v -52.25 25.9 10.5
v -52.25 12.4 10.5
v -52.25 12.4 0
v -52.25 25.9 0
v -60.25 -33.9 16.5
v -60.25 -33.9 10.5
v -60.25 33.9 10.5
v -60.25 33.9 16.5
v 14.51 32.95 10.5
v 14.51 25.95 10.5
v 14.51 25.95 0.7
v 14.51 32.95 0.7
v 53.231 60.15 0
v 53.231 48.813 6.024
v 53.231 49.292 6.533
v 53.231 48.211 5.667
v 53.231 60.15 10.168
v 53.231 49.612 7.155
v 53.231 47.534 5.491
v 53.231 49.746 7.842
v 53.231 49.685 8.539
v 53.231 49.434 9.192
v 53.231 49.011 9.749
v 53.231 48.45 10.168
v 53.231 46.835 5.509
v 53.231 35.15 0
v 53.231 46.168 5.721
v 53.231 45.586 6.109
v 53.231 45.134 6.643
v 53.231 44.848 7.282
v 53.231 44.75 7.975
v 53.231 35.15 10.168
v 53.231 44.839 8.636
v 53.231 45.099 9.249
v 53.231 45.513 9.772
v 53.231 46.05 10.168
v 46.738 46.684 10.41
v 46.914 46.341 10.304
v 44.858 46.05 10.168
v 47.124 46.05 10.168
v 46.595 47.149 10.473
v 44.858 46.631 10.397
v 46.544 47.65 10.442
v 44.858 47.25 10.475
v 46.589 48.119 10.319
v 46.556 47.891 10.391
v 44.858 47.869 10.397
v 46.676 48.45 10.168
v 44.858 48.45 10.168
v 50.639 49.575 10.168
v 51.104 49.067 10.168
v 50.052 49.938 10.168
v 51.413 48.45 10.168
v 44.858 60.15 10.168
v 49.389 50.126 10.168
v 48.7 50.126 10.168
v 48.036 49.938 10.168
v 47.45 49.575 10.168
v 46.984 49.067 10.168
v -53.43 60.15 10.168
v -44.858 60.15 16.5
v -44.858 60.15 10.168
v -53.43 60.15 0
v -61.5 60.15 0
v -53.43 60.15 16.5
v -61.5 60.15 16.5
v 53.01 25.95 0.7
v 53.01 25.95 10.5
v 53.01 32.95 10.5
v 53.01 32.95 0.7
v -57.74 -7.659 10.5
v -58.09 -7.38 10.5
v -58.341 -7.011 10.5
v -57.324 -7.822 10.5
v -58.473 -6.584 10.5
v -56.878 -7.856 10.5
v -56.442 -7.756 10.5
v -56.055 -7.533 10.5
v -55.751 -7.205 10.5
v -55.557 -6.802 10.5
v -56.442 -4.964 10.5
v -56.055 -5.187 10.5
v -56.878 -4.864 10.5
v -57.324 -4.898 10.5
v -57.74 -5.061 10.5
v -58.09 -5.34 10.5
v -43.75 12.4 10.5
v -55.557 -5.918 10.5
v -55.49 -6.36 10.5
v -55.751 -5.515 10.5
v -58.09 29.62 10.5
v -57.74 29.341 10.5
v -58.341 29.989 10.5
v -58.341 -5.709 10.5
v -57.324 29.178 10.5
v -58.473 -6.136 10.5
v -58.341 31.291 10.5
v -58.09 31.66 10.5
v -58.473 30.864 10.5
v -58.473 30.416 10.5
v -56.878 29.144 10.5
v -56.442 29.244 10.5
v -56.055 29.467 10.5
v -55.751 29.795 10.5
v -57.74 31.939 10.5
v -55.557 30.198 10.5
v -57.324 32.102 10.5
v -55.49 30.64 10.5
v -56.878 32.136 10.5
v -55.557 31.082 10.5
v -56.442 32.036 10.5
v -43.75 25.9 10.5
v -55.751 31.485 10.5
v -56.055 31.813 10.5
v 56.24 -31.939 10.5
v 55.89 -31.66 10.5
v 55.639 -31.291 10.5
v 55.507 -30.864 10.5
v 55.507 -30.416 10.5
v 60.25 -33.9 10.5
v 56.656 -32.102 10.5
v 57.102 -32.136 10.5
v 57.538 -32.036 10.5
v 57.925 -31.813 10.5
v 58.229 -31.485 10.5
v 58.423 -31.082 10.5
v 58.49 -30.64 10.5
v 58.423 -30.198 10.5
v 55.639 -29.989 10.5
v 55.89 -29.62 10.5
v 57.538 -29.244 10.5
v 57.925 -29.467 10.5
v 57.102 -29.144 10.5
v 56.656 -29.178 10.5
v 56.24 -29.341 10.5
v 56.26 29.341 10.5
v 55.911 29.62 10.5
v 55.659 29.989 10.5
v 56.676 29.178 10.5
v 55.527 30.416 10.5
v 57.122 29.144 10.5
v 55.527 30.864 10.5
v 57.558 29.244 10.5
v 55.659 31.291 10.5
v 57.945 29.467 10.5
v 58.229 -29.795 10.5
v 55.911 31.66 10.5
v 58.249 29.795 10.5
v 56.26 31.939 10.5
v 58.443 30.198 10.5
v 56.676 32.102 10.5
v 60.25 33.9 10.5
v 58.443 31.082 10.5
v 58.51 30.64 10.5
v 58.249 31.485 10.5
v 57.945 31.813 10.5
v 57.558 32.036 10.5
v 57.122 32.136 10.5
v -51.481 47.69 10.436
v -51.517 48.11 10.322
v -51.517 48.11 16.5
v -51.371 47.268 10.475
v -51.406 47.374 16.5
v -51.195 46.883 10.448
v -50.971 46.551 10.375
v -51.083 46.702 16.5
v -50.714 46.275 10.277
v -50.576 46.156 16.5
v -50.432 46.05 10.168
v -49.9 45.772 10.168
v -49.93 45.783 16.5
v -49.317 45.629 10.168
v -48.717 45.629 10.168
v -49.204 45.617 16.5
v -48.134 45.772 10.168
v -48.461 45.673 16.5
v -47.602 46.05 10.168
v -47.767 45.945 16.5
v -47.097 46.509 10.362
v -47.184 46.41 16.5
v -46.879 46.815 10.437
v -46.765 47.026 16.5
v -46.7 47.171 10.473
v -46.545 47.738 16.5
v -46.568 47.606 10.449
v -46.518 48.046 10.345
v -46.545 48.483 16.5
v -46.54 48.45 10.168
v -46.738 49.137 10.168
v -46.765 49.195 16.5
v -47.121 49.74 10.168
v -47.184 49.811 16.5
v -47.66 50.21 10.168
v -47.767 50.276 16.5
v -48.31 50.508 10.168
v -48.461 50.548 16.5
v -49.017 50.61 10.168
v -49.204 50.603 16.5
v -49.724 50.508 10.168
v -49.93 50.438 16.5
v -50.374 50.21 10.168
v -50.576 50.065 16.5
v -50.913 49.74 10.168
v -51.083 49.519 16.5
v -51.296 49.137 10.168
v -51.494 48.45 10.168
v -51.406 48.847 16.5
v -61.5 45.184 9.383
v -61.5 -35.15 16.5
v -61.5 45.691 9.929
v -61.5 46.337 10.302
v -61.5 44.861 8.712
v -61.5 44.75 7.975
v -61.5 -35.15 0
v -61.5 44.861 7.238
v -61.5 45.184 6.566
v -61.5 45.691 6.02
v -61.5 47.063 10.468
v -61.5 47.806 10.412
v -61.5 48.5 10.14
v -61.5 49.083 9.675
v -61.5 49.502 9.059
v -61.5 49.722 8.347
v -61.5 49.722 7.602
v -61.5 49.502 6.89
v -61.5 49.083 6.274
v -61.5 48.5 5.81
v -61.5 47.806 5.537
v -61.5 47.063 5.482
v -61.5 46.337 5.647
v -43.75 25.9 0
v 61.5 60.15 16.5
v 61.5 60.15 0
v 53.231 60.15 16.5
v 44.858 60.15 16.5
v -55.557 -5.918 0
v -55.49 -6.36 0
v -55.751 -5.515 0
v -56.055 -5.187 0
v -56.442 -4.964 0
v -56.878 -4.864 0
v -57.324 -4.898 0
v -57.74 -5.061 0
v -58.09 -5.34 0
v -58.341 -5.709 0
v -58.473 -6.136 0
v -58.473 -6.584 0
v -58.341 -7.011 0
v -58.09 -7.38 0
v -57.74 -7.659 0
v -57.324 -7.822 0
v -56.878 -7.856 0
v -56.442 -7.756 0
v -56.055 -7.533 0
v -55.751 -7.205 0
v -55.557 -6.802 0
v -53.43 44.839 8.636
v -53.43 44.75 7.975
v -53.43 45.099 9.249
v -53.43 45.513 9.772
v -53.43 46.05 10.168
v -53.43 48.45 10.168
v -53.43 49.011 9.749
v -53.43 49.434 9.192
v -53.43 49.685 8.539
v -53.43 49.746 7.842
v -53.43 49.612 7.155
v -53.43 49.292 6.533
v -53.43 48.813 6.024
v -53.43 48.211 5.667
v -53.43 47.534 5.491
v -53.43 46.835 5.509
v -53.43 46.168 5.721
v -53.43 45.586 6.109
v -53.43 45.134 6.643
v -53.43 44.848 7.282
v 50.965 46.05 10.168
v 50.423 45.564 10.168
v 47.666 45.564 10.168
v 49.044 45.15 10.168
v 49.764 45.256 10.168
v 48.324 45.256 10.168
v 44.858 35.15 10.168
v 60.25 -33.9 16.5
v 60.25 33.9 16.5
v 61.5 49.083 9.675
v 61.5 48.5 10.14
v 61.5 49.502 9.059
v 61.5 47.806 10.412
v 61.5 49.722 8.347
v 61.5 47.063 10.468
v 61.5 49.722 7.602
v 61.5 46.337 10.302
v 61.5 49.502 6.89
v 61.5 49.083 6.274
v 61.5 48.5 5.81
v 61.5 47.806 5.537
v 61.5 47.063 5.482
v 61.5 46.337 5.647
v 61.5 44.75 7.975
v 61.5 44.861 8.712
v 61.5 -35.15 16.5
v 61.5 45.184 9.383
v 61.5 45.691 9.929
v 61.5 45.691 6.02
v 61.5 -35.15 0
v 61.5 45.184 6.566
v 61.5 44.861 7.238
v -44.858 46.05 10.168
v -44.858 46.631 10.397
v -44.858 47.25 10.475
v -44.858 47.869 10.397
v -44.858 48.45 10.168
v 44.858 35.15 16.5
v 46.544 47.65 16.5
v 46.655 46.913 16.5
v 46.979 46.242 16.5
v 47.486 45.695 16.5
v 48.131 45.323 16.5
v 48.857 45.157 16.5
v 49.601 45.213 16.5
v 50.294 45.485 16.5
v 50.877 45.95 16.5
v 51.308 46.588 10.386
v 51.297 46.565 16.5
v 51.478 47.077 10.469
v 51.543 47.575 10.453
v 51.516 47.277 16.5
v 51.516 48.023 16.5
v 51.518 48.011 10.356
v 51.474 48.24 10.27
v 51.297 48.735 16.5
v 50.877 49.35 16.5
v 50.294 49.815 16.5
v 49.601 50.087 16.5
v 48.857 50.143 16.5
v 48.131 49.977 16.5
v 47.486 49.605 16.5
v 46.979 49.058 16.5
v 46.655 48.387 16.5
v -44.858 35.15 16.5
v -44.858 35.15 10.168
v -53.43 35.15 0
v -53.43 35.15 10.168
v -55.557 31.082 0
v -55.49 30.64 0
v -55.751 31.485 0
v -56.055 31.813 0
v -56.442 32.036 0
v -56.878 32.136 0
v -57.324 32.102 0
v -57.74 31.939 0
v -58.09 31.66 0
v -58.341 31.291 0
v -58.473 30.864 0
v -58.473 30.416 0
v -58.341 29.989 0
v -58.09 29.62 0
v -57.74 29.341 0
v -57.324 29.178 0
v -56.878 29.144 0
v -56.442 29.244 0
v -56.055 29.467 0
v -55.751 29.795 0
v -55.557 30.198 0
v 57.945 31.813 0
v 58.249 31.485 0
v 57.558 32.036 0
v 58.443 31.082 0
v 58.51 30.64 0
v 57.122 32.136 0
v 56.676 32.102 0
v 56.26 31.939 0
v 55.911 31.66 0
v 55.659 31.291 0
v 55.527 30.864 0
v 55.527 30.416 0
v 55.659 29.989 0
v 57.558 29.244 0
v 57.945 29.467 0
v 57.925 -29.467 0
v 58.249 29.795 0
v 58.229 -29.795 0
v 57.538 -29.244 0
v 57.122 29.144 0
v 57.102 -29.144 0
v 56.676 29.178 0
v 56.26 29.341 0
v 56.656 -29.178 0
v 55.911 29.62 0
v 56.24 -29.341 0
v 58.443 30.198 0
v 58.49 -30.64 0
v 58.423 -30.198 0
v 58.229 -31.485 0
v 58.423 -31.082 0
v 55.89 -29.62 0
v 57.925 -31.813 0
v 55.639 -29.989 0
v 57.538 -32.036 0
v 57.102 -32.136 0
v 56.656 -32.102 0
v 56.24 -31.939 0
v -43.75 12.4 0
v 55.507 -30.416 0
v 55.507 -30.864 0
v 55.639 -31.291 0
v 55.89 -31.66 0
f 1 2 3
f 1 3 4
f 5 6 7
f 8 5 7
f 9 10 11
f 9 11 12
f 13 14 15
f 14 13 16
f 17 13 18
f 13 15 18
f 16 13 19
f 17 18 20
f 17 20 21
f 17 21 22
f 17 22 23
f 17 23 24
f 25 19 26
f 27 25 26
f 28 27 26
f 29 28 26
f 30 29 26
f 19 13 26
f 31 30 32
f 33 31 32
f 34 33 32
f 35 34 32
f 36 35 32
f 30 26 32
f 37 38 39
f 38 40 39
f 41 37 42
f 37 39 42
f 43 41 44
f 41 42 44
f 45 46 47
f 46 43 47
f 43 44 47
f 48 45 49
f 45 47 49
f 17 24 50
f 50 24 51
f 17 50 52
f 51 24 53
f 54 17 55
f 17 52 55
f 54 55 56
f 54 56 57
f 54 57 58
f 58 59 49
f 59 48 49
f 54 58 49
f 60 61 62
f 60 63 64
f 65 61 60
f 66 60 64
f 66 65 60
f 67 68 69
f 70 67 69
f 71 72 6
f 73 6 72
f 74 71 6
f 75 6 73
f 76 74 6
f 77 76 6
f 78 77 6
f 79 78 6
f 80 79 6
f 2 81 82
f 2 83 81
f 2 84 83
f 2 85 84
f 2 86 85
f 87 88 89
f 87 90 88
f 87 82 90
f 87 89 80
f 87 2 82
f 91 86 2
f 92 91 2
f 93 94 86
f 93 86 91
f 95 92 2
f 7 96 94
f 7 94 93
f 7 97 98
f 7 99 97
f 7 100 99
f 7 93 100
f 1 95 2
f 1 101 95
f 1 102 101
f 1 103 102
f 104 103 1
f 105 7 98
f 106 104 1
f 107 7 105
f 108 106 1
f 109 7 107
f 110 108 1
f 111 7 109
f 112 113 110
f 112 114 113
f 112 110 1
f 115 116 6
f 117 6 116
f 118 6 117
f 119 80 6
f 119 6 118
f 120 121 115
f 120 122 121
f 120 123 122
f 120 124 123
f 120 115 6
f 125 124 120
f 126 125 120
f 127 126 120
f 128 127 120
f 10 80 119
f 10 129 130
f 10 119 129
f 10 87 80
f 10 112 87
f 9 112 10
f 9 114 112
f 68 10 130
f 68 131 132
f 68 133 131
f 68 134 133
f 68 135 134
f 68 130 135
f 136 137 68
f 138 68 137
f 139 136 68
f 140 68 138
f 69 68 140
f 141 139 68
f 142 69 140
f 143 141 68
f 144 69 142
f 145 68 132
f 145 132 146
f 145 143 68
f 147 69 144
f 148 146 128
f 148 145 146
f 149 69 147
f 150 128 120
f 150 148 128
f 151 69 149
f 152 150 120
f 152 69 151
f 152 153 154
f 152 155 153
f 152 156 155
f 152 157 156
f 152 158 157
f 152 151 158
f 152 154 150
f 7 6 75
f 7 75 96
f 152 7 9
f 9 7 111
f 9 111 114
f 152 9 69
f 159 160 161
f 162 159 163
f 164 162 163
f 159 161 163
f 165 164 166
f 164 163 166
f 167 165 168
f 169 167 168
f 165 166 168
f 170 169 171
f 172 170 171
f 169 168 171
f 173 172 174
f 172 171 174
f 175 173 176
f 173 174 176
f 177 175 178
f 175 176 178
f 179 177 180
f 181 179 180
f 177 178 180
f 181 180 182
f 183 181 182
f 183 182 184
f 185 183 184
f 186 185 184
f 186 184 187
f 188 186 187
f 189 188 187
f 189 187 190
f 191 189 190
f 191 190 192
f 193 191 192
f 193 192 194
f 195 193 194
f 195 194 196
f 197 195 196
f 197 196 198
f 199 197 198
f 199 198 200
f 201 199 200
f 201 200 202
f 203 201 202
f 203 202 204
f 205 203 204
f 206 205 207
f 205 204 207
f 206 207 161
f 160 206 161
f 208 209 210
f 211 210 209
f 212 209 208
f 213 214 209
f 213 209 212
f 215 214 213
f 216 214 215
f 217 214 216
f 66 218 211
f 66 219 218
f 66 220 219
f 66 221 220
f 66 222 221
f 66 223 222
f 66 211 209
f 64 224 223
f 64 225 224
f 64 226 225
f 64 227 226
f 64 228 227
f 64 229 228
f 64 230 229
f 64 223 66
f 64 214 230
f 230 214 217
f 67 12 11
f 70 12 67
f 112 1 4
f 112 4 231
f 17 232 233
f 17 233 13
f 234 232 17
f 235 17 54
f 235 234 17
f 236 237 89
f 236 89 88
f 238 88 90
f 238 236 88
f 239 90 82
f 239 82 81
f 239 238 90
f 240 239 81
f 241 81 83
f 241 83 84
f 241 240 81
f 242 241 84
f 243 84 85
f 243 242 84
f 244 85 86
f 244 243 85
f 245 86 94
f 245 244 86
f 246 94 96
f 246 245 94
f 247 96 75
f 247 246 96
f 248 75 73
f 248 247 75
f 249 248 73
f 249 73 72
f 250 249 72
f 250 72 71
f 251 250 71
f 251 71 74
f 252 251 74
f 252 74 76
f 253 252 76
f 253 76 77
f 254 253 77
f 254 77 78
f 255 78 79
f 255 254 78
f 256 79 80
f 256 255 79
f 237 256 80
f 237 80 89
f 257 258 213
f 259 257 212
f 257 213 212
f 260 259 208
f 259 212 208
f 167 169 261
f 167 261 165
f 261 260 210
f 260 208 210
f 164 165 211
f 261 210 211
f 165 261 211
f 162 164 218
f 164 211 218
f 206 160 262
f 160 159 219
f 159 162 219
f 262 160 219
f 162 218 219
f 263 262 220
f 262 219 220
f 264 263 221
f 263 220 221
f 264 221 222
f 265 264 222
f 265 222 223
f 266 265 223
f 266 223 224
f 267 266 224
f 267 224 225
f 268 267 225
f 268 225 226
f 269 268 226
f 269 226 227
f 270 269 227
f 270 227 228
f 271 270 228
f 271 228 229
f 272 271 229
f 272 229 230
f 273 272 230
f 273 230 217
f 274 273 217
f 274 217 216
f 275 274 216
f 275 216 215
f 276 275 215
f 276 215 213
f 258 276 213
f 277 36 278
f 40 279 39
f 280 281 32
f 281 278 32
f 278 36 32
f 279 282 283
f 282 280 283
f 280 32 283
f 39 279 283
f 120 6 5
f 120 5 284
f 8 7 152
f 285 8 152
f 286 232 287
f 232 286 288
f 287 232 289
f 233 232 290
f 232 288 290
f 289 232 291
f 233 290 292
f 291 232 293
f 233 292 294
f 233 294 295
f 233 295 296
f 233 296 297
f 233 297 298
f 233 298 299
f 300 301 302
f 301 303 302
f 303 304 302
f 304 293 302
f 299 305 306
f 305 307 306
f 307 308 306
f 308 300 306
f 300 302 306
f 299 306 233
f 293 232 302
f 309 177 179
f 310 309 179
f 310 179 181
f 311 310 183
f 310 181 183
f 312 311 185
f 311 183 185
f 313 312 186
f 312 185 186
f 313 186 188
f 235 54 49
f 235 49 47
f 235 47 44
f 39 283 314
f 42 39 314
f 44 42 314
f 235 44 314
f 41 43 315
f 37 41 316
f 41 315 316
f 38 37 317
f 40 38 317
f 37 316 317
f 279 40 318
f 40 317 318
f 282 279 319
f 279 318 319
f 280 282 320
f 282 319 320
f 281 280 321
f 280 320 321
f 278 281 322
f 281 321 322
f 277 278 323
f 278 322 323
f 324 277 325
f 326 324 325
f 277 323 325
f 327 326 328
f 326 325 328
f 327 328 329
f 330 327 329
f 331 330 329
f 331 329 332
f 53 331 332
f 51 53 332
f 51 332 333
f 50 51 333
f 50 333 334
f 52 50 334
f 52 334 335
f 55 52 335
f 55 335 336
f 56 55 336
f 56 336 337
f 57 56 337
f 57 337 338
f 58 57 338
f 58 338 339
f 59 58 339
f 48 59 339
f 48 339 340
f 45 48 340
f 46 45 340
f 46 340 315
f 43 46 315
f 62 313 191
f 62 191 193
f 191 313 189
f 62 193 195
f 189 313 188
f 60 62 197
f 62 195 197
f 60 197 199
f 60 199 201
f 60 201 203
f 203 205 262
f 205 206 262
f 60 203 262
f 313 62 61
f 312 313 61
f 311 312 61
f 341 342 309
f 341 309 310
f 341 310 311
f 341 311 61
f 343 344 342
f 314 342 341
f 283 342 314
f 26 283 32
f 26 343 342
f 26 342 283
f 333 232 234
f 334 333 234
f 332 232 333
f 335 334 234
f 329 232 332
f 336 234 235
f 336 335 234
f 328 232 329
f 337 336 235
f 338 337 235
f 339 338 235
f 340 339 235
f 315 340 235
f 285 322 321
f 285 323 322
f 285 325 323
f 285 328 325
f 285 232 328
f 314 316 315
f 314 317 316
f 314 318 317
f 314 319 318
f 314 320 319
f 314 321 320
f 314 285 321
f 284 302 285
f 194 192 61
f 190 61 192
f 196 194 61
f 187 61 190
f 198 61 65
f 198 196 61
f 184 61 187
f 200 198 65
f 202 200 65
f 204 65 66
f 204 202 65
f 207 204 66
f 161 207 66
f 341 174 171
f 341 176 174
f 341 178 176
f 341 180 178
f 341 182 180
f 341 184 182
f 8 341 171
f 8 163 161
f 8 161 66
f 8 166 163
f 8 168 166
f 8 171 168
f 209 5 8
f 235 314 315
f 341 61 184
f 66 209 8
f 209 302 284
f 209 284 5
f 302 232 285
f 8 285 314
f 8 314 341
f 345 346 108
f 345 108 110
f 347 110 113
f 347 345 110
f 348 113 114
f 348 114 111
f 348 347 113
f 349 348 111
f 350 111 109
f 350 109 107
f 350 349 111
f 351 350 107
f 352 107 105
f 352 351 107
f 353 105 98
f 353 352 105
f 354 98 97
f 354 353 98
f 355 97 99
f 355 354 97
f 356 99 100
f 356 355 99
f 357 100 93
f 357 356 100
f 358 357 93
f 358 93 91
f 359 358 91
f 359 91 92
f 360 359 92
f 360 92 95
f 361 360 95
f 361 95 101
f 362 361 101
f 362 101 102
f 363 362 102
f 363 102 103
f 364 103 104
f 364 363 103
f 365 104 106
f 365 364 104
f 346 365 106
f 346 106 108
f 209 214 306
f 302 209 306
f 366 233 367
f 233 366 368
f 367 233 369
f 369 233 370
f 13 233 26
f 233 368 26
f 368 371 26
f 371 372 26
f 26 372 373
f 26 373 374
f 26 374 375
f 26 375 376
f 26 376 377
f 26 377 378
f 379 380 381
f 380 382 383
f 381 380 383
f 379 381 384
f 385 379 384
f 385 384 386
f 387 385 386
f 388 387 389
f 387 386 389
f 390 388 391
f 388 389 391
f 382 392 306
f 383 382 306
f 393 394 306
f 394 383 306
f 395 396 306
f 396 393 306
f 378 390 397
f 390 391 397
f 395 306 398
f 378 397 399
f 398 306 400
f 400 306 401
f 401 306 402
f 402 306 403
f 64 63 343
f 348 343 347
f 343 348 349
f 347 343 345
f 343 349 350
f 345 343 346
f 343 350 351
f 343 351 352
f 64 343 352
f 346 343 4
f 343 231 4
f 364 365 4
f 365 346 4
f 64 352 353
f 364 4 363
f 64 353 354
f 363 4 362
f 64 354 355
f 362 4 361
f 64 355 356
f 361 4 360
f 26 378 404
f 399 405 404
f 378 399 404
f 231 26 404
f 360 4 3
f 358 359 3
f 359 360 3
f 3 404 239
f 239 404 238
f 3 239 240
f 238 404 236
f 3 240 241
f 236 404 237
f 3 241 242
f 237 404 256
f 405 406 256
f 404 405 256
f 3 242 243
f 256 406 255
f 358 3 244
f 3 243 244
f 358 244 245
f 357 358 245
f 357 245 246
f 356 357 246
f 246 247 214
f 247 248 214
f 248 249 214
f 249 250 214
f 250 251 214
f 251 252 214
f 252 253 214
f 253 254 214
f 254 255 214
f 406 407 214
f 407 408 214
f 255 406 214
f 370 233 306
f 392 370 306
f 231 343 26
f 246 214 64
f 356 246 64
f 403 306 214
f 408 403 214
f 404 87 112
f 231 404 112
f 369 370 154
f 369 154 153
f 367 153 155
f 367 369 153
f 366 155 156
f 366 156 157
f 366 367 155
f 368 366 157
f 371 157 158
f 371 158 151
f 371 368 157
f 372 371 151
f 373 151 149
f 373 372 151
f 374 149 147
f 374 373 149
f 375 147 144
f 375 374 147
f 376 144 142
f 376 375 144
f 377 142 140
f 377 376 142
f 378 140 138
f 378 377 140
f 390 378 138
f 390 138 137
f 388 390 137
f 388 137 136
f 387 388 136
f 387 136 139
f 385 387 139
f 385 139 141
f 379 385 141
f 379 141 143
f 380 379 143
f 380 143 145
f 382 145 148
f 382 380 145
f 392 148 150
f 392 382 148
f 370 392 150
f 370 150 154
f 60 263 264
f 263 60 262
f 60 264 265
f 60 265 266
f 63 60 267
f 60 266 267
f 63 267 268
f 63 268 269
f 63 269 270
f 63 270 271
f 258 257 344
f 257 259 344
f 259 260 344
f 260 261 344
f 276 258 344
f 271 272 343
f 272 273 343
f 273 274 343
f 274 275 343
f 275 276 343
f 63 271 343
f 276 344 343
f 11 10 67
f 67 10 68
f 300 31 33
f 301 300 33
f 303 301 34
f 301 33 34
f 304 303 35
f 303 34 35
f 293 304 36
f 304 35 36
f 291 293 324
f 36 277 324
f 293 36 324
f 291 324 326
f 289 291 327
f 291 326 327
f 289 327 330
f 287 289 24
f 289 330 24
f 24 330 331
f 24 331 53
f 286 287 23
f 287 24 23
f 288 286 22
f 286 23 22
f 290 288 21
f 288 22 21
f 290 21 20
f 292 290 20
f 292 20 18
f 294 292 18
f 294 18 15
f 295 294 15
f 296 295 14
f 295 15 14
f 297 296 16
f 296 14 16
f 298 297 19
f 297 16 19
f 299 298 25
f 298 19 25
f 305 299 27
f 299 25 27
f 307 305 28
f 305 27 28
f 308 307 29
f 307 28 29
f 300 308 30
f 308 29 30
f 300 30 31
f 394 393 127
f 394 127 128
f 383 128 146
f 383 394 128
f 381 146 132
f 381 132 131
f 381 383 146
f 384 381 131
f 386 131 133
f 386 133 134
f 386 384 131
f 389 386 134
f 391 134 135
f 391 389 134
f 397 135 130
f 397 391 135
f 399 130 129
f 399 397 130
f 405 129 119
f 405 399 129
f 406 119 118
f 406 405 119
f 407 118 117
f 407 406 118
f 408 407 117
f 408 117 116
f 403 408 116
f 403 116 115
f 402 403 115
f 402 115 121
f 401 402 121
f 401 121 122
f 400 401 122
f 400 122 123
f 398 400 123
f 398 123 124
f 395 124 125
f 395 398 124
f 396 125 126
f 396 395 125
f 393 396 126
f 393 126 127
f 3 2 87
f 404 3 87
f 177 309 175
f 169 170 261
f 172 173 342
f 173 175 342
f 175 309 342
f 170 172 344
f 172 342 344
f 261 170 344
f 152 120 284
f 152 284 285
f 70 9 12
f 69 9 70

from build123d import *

# Parameters (mm, degrees)
F0_W     = 123
F0_H     = 70.3
F0_W_2   = 120.5
F0_H_2   = 67.8
F1_DEPTH = 16.5
F0_R     = 1.5
F2_DEPTH = 10.5
F3_W     = 38.5
F3_H     = 7
F4_DEPTH = 9.8
F3_W_2   = 8.5
F3_H_2   = 13.5
F5_DEPTH = 25
F6_W     = 8.3734206855
F6_H     = 6.3322774097
F6_W_2   = 8.5727833211
F7_DEPTH = 25
F9_D     = 5
F11_D    = 5
F13_D    = 5


with BuildPart() as f1:
    # F0 (on Top) → F1 (new body)
    with BuildSketch(Plane.XY):
        Rectangle(F0_W, F0_H)
        Rectangle(F0_W_2, F0_H_2, mode=Mode.SUBTRACT)
    extrude(amount=F1_DEPTH)

    # F0 (on Top) → F2 (join)
    with BuildSketch(Plane.XY):
        Rectangle(F0_W_2, F0_H_2)
        with Locations((-56.99, -6.36)):
            Circle(F0_R, mode=Mode.SUBTRACT)
        with Locations((56.99, -30.64)):
            Circle(F0_R, mode=Mode.SUBTRACT)
        with Locations((-56.99, 30.64)):
            Circle(F0_R, mode=Mode.SUBTRACT)
        with Locations((57.01009, 30.64)):
            Circle(F0_R, mode=Mode.SUBTRACT)
    extrude(amount=F2_DEPTH)

    # F3 (on face) → F4 (cut)
    with BuildSketch(Plane.XY.offset(10.5)):
        with Locations((33.76009, 29.45)):
            Rectangle(F3_W, F3_H)
    extrude(amount=-F4_DEPTH, mode=Mode.SUBTRACT)

    # F3 (on face) → F5 (cut)
    with BuildSketch(Plane.XY.offset(10.5)):
        with Locations((-48, 19.15)):
            Rectangle(F3_W_2, F3_H_2)
    extrude(amount=-F5_DEPTH, mode=Mode.SUBTRACT)

    # F6 (on face) → F7 (join)
    with BuildSketch(Plane(origin=(0, 35.15, 0), x_dir=(-1, 0, 0), z_dir=(0, 1, 0))):
        with Locations((-49.0443054587, 13.3338612951)):
            Rectangle(F6_W, F6_H)
        Polygon((-53.2310158014, 16.5), (-61.5, 16.5), (-61.5, 0), (-53.2310158014, 0), (-53.2310158014, 10.1677225903), align=None)
        with Locations((49.1439905018, 13.3338612951)):
            Rectangle(F6_W_2, F6_H)
        Polygon((53.4303821623, 10.1677225903), (53.4303821623, 0), (61.5, 0), (61.5, 16.5), (53.4303821623, 16.5), align=None)
    extrude(amount=F7_DEPTH)

    # F9 (through all)
    with Locations(Plane(origin=(0, 0, 10.1677225903), x_dir=(1, 0, 0), z_dir=(0, 0, -1))):
        with Locations((-49.0169860423, -48.110447824)):
            Hole(F9_D / 2)

    # F11 (through all)
    with Locations(Plane(origin=(0, 0, 10.1677225903), x_dir=(1, 0, 0), z_dir=(0, 0, -1))):
        with Locations((49.044303596, -47.65)):
            Hole(F11_D / 2)

    # F13 (through all)
    with Locations(Plane.YZ.offset(61.5)):
        with Locations((47.2500026226, 7.9746842384)):
            Hole(F13_D / 2)


solid = f1.part
